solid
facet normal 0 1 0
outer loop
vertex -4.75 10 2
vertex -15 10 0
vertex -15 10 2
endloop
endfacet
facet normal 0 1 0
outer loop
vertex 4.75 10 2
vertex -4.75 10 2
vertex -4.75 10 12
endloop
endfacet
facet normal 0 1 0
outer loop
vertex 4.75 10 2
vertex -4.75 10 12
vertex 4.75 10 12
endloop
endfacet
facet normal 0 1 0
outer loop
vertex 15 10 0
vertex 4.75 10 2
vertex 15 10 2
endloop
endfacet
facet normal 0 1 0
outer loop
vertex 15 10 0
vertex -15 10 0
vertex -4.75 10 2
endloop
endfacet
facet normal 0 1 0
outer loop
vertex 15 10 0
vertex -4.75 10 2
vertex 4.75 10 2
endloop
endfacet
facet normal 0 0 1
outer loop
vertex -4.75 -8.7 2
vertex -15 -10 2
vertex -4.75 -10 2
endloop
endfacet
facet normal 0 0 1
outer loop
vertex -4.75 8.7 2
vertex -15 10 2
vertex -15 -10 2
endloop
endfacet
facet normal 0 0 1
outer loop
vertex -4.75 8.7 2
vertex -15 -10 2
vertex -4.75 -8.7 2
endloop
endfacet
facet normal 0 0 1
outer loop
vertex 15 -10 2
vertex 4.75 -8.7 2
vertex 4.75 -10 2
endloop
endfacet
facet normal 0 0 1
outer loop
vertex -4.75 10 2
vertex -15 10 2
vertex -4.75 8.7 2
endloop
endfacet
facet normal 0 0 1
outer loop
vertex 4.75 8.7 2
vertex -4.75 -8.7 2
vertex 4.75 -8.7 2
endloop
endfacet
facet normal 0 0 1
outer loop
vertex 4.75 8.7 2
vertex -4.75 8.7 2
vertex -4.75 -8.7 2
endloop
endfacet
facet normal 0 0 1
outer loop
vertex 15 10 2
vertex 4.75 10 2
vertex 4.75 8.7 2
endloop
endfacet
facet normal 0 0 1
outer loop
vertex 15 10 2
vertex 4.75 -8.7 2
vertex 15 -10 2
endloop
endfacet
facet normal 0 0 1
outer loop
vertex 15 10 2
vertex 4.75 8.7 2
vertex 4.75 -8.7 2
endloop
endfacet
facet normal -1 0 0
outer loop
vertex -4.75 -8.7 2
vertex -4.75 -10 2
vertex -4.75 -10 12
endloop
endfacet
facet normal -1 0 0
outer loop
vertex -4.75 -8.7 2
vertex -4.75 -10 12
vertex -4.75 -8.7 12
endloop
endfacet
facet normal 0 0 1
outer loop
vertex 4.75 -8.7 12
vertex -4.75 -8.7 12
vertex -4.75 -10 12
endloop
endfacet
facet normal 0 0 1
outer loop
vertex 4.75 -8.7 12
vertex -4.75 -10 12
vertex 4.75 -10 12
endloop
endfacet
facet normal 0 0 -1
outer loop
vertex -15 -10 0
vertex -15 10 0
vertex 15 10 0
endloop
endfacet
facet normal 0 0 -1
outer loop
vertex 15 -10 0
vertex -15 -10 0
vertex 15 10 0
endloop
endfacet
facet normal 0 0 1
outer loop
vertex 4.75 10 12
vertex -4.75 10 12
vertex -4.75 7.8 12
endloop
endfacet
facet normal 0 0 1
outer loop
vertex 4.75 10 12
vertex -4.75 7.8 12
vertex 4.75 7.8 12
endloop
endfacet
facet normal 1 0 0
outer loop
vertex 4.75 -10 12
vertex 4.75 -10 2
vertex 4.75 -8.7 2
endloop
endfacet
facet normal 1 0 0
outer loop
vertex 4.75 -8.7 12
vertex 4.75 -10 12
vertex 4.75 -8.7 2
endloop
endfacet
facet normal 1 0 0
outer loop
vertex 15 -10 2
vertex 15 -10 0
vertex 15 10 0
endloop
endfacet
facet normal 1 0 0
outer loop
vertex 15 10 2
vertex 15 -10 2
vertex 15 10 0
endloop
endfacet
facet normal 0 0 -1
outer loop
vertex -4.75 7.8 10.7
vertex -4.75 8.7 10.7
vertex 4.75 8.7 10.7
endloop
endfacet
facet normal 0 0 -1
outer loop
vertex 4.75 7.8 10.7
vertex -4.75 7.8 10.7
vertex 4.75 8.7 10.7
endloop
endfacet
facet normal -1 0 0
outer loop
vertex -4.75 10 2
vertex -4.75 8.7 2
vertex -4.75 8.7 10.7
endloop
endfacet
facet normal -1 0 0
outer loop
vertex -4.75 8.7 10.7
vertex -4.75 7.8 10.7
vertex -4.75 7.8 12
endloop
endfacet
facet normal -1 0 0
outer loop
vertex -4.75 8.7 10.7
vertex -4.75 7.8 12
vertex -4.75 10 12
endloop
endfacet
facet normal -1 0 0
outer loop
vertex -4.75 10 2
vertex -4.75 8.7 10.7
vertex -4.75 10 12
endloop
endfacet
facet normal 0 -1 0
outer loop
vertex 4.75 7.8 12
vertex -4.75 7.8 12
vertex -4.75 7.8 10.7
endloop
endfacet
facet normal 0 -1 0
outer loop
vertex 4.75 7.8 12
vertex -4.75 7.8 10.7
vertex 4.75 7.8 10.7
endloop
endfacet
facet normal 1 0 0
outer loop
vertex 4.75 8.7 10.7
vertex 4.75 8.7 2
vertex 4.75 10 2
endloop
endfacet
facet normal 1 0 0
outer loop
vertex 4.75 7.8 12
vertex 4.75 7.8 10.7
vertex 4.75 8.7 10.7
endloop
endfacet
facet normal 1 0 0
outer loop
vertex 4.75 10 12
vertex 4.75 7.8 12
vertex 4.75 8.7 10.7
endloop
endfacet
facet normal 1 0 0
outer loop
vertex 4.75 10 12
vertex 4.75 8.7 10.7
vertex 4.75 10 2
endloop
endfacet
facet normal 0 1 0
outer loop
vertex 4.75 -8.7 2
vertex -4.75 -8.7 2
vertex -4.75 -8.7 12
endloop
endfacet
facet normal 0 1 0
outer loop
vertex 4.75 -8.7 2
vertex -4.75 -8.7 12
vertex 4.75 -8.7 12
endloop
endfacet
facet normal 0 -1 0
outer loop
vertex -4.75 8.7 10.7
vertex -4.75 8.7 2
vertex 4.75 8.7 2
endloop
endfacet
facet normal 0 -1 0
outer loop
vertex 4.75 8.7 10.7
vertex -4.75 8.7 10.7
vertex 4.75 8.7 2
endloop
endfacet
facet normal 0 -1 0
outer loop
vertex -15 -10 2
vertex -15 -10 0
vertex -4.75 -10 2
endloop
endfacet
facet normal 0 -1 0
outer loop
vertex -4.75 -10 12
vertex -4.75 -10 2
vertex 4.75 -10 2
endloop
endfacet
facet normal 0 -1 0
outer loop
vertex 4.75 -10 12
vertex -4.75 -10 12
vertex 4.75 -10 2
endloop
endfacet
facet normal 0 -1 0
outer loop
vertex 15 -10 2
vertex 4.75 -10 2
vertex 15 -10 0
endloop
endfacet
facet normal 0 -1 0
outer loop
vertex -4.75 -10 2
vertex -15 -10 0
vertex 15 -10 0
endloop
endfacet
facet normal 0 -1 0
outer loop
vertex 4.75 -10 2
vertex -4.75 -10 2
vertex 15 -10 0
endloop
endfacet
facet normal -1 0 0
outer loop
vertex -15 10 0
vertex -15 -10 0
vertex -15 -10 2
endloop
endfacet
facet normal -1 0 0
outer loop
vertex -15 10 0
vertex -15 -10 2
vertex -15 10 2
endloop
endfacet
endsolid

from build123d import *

# Parameters (mm, degrees)
SKETCH_W     = 30
SKETCH_H     = 20
PAD_DEPTH    = 2
SKETCH001_W  = 9.5
SKETCH001_H  = 1.3
PAD001_DEPTH = 10
SKETCH002_W  = 9.5
SKETCH002_H  = 2.2
PAD002_DEPTH = 1.3


with BuildPart() as part:
    # Sketch → Pad (new body)
    with BuildSketch(Plane.XY):
        Rectangle(SKETCH_W, SKETCH_H)
    extrude(amount=PAD_DEPTH)

    # Sketch001 (on Face6 of Pad) → Pad001 (join)
    with BuildSketch(Plane.XY.offset(2)):
        with Locations((0, 9.35)):
            Rectangle(SKETCH001_W, SKETCH001_H)
        with Locations((0, -9.35)):
            Rectangle(SKETCH001_W, SKETCH001_H)
    extrude(amount=PAD001_DEPTH)

    # Sketch002 (on Face16 of Pad001) → Pad002 (join)
    with BuildSketch(Plane.XY.offset(12)):
        with Locations((0, 8.9)):
            Rectangle(SKETCH002_W, SKETCH002_H)
    extrude(amount=-PAD002_DEPTH)


solid = part.part
